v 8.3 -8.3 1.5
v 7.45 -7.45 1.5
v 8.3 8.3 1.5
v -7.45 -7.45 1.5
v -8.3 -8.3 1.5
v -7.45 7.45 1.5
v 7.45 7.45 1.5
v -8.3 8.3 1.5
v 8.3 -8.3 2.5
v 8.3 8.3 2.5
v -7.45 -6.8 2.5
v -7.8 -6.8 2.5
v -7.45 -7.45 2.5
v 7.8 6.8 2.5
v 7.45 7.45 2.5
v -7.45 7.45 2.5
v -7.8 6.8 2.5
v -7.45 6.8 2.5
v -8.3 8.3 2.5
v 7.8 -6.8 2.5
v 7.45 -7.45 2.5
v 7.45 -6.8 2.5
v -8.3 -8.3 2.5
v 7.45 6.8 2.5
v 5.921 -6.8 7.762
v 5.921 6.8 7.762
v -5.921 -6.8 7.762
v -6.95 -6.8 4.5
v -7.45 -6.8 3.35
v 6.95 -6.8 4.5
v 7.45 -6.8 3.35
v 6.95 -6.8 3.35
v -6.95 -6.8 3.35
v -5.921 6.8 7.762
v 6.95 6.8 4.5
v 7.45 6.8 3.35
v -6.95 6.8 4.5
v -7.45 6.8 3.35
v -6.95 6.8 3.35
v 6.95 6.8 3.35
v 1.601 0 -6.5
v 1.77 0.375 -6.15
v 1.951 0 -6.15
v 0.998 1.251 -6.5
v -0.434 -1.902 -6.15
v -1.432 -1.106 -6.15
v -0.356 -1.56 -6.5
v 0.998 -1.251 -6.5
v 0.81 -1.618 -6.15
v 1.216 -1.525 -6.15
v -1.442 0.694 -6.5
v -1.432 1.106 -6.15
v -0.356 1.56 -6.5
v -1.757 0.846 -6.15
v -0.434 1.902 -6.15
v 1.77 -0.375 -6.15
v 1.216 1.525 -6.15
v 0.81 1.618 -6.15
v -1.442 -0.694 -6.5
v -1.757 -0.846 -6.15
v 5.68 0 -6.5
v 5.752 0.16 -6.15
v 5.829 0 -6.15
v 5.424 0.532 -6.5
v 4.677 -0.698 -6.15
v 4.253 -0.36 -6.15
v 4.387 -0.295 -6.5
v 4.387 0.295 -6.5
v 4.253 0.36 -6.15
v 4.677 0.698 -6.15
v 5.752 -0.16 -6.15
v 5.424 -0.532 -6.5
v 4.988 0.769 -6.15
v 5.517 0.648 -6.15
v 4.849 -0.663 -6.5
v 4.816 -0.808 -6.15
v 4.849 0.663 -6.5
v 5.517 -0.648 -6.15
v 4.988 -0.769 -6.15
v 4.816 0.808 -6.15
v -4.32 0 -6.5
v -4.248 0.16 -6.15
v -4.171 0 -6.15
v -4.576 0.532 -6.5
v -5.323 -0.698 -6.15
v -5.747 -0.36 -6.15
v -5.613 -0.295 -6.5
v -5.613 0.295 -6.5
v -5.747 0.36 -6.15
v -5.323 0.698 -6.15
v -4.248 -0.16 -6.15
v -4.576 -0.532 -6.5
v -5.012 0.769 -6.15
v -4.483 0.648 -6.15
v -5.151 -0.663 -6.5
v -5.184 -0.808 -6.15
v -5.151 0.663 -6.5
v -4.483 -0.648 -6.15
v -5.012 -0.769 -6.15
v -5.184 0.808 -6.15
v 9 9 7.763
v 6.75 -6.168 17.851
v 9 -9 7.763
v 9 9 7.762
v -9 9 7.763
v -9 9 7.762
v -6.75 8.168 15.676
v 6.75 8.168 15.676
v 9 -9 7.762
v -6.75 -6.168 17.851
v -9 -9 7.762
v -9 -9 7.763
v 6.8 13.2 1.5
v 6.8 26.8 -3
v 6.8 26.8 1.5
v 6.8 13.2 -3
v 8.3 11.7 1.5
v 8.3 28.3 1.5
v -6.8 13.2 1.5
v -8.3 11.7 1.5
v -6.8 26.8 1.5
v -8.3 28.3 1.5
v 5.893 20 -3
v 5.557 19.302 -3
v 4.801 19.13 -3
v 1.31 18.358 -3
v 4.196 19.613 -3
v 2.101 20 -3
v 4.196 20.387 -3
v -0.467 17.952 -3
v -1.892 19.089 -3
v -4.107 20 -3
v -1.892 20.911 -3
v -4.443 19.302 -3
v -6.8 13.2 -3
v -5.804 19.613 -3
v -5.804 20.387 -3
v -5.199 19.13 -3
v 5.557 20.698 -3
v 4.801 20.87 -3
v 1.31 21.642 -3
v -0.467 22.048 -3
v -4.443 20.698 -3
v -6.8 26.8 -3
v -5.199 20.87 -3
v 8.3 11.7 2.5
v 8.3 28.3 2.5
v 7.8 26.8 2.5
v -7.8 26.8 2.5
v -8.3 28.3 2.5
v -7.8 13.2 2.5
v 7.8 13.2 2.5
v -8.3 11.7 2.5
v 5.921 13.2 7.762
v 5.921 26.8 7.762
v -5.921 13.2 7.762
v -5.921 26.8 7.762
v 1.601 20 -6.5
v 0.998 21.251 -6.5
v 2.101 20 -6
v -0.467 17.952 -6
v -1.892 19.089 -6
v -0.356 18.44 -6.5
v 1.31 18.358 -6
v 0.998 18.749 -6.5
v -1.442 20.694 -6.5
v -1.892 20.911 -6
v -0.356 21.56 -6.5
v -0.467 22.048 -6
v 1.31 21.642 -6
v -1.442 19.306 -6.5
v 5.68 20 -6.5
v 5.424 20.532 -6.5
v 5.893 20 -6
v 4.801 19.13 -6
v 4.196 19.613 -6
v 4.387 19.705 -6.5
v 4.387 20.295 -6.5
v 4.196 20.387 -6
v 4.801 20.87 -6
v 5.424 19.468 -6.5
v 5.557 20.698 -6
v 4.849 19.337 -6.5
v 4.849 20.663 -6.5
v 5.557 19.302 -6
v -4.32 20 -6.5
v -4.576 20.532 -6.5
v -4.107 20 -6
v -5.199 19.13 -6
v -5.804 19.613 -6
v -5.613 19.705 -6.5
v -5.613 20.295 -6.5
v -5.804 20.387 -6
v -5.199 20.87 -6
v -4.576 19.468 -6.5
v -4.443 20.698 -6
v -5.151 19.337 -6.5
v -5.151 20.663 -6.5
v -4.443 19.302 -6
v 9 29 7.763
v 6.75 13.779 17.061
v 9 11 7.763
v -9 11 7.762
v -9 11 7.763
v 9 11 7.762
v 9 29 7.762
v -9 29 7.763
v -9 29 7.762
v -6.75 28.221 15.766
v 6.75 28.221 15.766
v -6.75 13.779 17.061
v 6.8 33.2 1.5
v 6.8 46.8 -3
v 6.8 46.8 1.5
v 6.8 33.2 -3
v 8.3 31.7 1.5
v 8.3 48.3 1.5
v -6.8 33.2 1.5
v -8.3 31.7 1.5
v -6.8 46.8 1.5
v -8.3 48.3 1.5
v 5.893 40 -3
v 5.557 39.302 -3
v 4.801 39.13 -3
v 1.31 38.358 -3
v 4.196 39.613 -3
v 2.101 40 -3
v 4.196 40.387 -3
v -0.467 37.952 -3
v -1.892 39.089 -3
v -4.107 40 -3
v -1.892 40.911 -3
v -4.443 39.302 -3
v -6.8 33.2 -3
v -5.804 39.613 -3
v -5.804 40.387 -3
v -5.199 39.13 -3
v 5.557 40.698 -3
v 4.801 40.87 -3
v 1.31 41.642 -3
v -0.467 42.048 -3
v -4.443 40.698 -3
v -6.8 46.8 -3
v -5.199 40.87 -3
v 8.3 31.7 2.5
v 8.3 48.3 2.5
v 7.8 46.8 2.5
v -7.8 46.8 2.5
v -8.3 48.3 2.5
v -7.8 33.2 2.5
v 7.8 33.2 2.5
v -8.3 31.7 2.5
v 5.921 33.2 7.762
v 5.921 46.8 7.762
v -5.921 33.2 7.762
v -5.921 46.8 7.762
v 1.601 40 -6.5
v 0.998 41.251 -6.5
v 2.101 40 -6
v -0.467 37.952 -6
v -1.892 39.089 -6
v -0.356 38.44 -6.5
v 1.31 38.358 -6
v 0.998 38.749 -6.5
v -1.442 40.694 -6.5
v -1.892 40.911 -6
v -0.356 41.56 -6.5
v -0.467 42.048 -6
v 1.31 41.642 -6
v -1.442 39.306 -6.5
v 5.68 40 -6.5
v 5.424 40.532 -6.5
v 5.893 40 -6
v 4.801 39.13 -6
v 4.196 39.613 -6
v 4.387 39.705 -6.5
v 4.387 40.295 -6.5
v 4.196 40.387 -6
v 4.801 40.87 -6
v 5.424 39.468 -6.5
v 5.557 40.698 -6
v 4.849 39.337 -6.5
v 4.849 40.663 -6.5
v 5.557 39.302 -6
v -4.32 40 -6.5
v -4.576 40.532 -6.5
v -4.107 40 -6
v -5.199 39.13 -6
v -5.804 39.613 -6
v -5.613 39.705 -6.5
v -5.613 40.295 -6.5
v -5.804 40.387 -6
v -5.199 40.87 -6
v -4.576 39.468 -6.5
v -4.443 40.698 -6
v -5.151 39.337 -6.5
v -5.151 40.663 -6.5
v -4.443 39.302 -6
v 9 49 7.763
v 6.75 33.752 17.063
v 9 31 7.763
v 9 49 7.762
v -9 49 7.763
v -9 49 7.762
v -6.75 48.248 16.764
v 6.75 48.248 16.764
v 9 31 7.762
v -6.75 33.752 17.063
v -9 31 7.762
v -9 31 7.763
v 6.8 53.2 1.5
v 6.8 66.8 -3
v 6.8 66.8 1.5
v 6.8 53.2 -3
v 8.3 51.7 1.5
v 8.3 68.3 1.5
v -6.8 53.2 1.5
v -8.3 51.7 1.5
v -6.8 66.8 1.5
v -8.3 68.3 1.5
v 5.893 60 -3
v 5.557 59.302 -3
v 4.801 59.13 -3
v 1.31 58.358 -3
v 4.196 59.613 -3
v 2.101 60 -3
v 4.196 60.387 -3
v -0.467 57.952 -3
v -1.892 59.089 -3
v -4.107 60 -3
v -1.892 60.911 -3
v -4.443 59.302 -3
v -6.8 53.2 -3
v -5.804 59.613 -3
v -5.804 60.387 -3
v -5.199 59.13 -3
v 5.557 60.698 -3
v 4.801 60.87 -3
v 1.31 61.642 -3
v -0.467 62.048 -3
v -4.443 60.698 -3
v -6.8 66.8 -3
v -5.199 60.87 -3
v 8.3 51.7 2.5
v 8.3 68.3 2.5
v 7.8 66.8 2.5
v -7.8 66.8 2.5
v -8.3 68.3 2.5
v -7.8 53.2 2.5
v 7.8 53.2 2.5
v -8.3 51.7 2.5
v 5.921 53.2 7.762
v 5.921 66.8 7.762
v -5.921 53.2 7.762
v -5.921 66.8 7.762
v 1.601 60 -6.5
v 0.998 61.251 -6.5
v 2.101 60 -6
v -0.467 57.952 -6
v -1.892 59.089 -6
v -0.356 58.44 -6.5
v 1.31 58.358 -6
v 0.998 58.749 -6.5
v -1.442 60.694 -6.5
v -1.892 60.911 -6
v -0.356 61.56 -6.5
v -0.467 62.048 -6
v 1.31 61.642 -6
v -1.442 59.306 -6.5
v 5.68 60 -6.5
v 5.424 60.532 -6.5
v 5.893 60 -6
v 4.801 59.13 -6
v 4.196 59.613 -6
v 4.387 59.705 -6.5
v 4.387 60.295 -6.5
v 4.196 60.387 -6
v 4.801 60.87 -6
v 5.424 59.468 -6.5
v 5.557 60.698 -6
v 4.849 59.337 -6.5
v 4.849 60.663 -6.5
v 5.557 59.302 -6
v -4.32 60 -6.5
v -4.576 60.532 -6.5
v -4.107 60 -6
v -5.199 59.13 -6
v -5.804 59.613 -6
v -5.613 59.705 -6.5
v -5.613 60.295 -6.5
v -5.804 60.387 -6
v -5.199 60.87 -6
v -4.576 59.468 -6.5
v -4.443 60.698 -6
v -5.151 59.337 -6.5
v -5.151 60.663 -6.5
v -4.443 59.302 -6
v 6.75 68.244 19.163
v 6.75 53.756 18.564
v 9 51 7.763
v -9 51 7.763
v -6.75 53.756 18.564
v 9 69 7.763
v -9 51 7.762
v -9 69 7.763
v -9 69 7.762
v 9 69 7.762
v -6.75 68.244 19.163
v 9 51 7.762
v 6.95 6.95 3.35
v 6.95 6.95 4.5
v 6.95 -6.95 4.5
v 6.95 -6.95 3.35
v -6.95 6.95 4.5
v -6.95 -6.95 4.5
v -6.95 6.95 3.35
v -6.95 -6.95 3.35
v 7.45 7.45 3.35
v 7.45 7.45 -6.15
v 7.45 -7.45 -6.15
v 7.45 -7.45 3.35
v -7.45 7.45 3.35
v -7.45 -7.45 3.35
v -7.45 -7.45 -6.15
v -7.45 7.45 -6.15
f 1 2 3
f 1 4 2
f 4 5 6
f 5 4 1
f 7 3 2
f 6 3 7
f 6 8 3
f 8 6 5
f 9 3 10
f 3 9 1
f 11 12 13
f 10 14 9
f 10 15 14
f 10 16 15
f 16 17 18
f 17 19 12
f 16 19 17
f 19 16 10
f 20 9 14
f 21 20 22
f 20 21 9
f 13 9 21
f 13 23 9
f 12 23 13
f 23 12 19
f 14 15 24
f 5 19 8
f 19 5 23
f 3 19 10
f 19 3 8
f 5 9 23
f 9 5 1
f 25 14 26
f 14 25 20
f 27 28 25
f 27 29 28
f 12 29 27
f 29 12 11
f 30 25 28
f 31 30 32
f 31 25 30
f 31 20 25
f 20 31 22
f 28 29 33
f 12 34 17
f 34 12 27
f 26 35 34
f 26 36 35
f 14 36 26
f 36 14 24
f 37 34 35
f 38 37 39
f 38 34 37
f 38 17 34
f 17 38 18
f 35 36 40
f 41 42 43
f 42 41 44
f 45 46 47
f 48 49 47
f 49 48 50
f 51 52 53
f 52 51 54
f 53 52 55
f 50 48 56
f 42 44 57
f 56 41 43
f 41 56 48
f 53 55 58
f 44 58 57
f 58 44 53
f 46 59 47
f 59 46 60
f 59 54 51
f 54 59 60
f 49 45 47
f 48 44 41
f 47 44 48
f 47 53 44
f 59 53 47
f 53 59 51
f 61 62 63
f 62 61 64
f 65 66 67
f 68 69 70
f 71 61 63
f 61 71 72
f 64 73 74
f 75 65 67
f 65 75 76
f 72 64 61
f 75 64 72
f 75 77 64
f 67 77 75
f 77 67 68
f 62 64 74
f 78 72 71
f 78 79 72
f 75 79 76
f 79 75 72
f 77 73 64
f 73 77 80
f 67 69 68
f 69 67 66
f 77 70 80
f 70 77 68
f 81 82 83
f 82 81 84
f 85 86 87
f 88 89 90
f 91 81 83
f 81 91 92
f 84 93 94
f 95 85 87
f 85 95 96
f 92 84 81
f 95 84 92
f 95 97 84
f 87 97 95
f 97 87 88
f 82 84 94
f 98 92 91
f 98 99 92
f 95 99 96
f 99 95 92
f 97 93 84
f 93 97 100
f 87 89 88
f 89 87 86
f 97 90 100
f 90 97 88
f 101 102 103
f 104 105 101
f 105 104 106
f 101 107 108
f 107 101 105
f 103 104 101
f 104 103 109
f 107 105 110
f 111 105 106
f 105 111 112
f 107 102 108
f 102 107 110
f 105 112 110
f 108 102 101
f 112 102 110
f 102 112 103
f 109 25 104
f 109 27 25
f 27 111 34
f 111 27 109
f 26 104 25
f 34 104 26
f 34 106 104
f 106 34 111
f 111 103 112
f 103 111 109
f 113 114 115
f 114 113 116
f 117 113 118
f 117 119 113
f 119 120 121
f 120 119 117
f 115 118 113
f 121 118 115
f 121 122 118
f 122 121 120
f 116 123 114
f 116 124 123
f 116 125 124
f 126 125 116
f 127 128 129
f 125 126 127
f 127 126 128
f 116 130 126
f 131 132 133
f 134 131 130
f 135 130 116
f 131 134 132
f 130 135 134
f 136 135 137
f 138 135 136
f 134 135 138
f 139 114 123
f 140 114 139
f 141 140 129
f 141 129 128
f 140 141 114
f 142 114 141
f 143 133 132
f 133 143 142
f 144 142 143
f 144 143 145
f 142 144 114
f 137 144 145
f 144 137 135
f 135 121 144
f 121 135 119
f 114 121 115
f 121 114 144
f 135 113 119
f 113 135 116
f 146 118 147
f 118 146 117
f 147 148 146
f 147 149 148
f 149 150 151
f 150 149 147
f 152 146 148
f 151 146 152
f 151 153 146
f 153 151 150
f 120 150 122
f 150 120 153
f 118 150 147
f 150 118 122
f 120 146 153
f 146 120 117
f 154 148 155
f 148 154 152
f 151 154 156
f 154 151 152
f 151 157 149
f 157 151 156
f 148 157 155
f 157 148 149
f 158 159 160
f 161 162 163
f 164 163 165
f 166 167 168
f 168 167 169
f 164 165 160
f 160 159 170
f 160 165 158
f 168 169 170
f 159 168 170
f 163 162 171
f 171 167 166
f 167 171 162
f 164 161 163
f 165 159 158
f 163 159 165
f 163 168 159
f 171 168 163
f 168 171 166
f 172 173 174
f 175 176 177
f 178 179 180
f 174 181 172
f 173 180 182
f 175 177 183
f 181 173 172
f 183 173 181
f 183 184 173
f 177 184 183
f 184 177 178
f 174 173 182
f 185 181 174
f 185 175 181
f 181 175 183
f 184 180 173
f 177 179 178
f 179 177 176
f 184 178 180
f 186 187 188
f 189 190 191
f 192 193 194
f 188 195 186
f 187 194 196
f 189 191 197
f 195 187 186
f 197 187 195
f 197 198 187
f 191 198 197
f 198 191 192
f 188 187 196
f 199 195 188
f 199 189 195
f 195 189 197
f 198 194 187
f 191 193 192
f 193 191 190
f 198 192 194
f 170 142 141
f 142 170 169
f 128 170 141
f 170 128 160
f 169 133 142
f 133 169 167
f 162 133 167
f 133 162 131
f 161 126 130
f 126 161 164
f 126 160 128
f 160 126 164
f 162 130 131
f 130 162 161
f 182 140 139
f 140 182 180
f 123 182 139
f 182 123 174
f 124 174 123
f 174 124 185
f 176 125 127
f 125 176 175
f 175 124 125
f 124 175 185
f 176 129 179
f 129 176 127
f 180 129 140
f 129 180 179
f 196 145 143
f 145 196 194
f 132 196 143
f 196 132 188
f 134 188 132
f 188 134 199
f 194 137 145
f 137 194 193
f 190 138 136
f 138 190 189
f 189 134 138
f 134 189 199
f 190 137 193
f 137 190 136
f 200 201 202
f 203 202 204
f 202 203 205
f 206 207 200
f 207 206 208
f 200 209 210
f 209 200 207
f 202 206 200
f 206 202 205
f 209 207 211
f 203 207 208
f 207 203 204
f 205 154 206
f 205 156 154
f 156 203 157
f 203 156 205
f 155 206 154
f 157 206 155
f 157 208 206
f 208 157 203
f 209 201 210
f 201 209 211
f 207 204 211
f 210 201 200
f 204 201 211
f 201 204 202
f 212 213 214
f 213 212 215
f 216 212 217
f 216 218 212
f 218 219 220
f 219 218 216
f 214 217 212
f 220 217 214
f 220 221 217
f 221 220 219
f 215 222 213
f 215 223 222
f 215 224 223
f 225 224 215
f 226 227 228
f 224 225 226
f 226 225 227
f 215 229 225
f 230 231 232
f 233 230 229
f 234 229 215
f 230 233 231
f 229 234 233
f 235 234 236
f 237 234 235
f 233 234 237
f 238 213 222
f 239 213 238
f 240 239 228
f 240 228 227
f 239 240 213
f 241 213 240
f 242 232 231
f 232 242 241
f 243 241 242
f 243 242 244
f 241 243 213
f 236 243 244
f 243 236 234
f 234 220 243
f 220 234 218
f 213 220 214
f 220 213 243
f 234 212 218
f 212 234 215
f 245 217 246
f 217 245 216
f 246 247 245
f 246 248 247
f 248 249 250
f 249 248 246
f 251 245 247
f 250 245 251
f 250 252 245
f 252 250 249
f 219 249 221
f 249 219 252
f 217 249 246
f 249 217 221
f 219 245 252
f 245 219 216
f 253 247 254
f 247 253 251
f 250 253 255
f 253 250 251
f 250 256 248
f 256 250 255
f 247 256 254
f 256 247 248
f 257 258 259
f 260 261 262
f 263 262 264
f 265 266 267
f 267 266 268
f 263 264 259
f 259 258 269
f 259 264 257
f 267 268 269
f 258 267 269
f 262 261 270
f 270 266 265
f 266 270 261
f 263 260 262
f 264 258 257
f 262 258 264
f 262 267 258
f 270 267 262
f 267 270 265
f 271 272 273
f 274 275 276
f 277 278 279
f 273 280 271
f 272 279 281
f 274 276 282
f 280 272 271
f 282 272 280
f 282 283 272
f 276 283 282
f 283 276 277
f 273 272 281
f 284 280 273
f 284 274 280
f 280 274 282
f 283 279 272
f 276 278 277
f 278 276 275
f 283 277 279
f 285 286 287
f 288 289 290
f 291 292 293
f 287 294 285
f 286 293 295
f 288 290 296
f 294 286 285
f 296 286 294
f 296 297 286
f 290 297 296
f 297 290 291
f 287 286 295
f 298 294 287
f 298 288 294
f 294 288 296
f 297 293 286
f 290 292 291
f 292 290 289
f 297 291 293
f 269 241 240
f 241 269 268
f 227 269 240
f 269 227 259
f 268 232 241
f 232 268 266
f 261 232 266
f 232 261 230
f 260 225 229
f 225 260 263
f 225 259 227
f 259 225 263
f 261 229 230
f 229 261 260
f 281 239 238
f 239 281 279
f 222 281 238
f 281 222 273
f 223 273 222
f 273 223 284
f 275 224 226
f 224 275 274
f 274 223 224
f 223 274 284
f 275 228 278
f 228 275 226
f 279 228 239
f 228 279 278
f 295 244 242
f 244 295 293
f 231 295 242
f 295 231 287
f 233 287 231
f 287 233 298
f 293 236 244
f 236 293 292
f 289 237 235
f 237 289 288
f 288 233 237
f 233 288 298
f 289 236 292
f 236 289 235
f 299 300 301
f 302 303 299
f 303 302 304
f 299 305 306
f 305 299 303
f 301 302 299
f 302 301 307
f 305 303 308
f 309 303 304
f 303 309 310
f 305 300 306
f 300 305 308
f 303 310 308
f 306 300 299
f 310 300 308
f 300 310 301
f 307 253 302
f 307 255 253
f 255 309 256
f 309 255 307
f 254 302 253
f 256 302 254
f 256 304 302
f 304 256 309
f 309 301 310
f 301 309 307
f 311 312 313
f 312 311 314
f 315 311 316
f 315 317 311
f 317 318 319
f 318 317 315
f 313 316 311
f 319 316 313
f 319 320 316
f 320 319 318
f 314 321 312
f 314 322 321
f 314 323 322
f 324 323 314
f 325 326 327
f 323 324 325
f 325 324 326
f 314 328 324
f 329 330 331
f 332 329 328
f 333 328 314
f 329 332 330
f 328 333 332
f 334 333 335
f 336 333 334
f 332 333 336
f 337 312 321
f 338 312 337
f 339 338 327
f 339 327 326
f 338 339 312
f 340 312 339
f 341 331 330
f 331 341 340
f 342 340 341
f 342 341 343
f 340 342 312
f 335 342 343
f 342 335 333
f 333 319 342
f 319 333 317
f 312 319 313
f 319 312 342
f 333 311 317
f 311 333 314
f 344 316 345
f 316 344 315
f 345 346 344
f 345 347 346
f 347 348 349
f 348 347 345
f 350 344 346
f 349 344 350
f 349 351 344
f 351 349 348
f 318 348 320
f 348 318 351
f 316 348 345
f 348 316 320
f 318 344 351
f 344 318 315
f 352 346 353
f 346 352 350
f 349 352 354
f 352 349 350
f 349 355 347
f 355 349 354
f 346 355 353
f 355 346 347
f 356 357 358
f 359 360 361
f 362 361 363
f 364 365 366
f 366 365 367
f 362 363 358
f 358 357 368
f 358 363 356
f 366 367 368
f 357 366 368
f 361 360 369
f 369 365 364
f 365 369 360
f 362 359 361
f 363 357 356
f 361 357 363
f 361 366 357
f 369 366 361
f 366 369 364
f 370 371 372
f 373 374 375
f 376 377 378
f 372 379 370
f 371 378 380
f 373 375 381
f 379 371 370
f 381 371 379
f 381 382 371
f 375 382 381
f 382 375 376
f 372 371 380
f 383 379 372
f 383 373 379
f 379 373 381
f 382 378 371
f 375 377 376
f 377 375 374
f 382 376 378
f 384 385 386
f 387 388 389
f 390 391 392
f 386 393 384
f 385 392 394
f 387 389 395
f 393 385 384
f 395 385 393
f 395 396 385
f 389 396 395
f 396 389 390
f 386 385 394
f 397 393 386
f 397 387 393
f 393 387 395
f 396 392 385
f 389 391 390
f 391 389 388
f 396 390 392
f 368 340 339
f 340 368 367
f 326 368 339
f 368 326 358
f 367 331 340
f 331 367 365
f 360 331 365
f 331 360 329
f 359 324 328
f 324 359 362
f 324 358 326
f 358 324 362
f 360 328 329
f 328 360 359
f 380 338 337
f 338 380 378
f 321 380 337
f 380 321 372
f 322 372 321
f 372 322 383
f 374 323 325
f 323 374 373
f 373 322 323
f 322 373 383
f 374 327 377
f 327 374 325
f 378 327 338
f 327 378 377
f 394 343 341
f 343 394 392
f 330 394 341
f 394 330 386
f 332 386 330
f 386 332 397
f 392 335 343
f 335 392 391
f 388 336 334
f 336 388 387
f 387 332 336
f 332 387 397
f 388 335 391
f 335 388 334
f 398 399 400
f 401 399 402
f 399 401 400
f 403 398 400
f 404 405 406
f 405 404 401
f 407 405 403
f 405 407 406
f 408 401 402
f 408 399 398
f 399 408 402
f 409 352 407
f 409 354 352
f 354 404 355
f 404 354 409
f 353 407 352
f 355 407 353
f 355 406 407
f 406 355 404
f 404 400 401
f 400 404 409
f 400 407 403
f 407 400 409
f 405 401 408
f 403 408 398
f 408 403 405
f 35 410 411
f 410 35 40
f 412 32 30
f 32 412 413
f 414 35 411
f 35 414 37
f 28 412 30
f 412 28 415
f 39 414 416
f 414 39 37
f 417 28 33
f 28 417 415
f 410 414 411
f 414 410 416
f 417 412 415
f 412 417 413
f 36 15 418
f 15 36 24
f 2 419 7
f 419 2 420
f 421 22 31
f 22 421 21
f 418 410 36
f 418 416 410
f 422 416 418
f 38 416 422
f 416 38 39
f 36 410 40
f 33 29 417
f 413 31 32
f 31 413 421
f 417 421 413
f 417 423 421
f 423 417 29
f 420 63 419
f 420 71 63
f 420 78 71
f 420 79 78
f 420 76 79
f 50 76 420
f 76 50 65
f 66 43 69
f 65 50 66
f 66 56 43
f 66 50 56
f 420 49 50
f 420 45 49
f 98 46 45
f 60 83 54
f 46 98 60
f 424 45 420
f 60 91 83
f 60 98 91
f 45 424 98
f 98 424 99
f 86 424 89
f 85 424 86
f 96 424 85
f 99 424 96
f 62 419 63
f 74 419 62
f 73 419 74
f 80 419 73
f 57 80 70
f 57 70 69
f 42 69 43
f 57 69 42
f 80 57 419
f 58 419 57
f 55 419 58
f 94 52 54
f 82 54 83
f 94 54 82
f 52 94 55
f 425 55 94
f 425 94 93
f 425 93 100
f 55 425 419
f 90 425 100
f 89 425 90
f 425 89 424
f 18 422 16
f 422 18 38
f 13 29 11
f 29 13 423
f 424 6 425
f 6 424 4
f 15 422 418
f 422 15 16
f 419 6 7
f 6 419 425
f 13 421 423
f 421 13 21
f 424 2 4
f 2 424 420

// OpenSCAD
//Enum Switch Type
MX   = 0;  // Generic MX
Choc = 1;  // Low profile 
Alps = 2;  // For Your Superiority Complex's Needs

//Switch cutawy Type
Cherry = 2; // for indent clip key cuts

//Cap type applys to MX only?
//Cherry = 0;
DSA = 1;
OEM = 2;
SA  = 4;
MT3 = 3;

//parameters
plate_thickness = 1;
plate_size = 15.6;
edge_offset = 1;
bottom_size = plate_size - 2;

top_height = 11.6;

switch_height = 3.0;
switch_thick = 1;
switch_width = 5;
switch_length = 3;

cap_height = .38*25.4;
cap_heightShift = 0.69*25.4;
cap_width = 18.3;

bottom_height = 4.5;
bottom_chamfer_width = 3.05;
bottom_chamfer_height =  1;
bottom_chamfer_thickness = .6;

bottom_peg_diameter = 4.075/.97;
bottom_peg_height =  3.5;
bottom_peg_chamfer = .5;
bottom_peg_side_scale = 1.7/4;

//dummy key switch with caps to check position
module Switch(switchScale= [1,1,1], CapColor = "ivory", StemColor = "black", clipLength = 0, type = Choc, Caps = DSA, Row = 0)
{
  if (type == MX){
    difference(){
      union(){
        translate([0,0,-switch_height])
        {
          color("grey"){
            translate([-bottom_size/2, -bottom_size/2 ,0])cube([bottom_size,bottom_size,bottom_height]);
            translate([-plate_size/2-edge_offset /2, -plate_size/2-edge_offset/2, bottom_height])cube([15.6+edge_offset ,15.6+edge_offset ,1]);

            translate([-plate_size/2, -plate_size/2, bottom_height])cube([15.6,15.6,1]);
            translate([-plate_size/2, -plate_size/2, bottom_height])cube([15.6,15.6,1]);

            translate([0,0, bottom_height+plate_thickness])translate([-15.6/2,13.6/2,0])rotate([90,0,0])linear_extrude(13.6)polygon(points = [[0,0], [15.6, 0], [13.6, 5.6], [2,5.6]]);
          }

          color(StemColor){
            translate([-switch_width/2, -switch_thick/2, top_height-1])cube([switch_width, switch_thick, switch_height]);
            translate([-switch_thick/2, -switch_length/2, top_height-1])cube([switch_thick, switch_length, switch_height]);
            translate([-plate_size/4, -plate_size/6, top_height-.5])cube([plate_size/2, plate_size/3, 0.25]);
          }
          if (Caps ==DSA){
            scale(switchScale)color(CapColor){
              translate([0,0,cap_heightShift-2])rotate([0,0,45])cylinder(d1 = cap_width*sqrt(2),d2 = (plate_size -4)*sqrt(2), 7.5, $fn=4, center = true);
            }
          } else if (Caps == OEM){
              if( Row == 0) {
                scale(switchScale)color(CapColor){
                  translate([0,0,cap_heightShift/2+2])
                    hull(){
                      cube([18,18,.001], center = true);
                      translate([0,1,(10.1+7.9)/2])rotate([atan((7.9-10.1)/14.5),0,0])cube([13.5,14.5,.001], center = true);
                  }
                }
              } else if( Row == 1) {
                scale(switchScale)color(CapColor){
                  translate([0,0,cap_heightShift/2+2])
                    hull(){
                      cube([18,18,.001], center = true);
                      translate([0,1,(8+9.3)/2])rotate([atan((8-9.3)/14.5),0,0])cube([13.5,14.5,.001], center = true);
                  }
                }
              } else if( Row == 2) {
              scale(switchScale)color(CapColor){
                  translate([0,0,cap_heightShift/2+2])
                    hull(){
                      cube([18,18,.001], center = true);
                      translate([0,1,(9+9.3)/2])rotate([atan((9-9.3)/14.5),0,0])cube([13.5,14.5,.001], center = true);
                  }
                }
              } else if( Row == 3) {
                scale(switchScale)color(CapColor){
                  translate([0,0,cap_heightShift/2+2])
                    hull(){
                      cube([18,18,.001], center = true);
                      translate([0,1,(11.4+10.8)/2])rotate([atan((11.4-10.8)/14.5),0,0])cube([13.5,14.5,.001], center = true);
                  }
                }
              }
          }
          else if (Caps == SA){
            scale(switchScale)color(CapColor){
              translate([0,0,cap_heightShift])rotate([0,0,45])cylinder(d1 = cap_width*sqrt(2),d2 = (plate_size -4)*sqrt(2), 11.73, $fn=4, center = true);
            }
          }
          color("grey"){
            translate([0,0, -(bottom_peg_height -bottom_peg_chamfer)]){
              cylinder(d=bottom_peg_diameter, h= bottom_peg_height -bottom_peg_chamfer);
              translate([5,0,0])scale(v=[bottom_peg_side_scale,bottom_peg_side_scale,1])cylinder(d=bottom_peg_diameter, h= bottom_peg_height -bottom_peg_chamfer);
              translate([-5,0,0])scale(v=[bottom_peg_side_scale,bottom_peg_side_scale,1])cylinder(d=bottom_peg_diameter, h= bottom_peg_height -bottom_peg_chamfer);

              translate([0,0, -bottom_peg_chamfer]){
                cylinder(d2=bottom_peg_diameter , d1 = bottom_peg_diameter -2*bottom_peg_chamfer, h= bottom_peg_chamfer);
                translate([5,0,0])scale(v=[bottom_peg_side_scale,bottom_peg_side_scale,1])cylinder(d2=bottom_peg_diameter , d1 = bottom_peg_diameter -2*bottom_peg_chamfer, h= bottom_peg_chamfer);
                translate([-5,0,0])scale(v=[bottom_peg_side_scale,bottom_peg_side_scale,1])cylinder(d2=bottom_peg_diameter , d1 = bottom_peg_diameter -2*bottom_peg_chamfer, h= bottom_peg_chamfer);
              }
            }
          }
        }
      }
      if (clipLength != 0){ // commiting unholy act in name of ergonomics
        translate([0, -sign(clipLength)*7.8-clipLength,  0])scale(switchScale)cube([20, 15.6, 50], center = true);
      }
    }
  } else if (type == Choc){
    difference(){
      union(){
        translate([0,0,1.75]){
          difference(){
            translate([0,0,0.5])cube([15,15,1], center = true);
            //cuts
        //    translate([15/2-1/2,0,.5])cube([1,10.5,2], center = true);
        //    translate([-15/2+1/2,0,.5])cube([1,10.5,2], center = true);
          }

          translate([0,0,1.5])cube([13,13,2], center = true);
          color(StemColor)translate([0,0,4])cube([11.4,4,3], center = true);
          color(StemColor)translate([0,1,4])cube([3,5,3], center = true);
          color("DarkSlateGray")translate([0,0,-1])cube([13,14,2,],center = true);
          color("DarkSlateGray")translate([0,0,-2-2.5])cylinder(d=3.3, 2.5);
          color("DarkSlateGray")translate([5,0,-2-2.5])cylinder(d=1.6, 2.5); 
          color("DarkSlateGray")translate([-5,0,-2-2.5])cylinder(d=1.6, 2.5); 

          //cap
          scale(switchScale)color(CapColor)hull(){
            translate([0,0,4.5+1])cube([17.5,16.8,2],center = true);
            translate([0,1.25,4.5+1+1.5])cube([14.5,12.5,1.5],center = true);
          }
        }
      }
      if (clipLength != 0){ // commiting unholy act in name of ergonomics
        translate([0, -sign(clipLength)*7.8-clipLength,  0])scale(switchScale)cube([20, 15.6, 40], center = true);
      }
    }
  }
  else if (type == Alps){
    //TODO build Alps MockUp
  }
}

module Cutter()
{
  bottom_height = 4.5;
  bottom_chamfer_width = 3;
  bottom_chamfer_height =  1;
  bottom_chamfer_thickness = .6;

  bottom_peg_diameter = 4;
  bottom_peg_height =  3;
  bottom_peg_chamfer = 1;
  bottom_peg_side_scale = 1.7/4;

  translate([-bottom_size/2, -bottom_size/2 ,0])cube([bottom_size,bottom_size,bottom_height]);

  translate([0,0, -(bottom_peg_height -bottom_peg_chamfer)]){
    cylinder(d=bottom_peg_diameter, h= bottom_peg_height -bottom_peg_chamfer);
    translate([5,0,0])scale(v=[bottom_peg_side_scale,bottom_peg_side_scale,1])cylinder(d=bottom_peg_diameter, h= bottom_peg_height -bottom_peg_chamfer);
    translate([-5,0,0])scale(v=[bottom_peg_side_scale,bottom_peg_side_scale,1])cylinder(d=bottom_peg_diameter, h= bottom_peg_height -bottom_peg_chamfer);

    translate([0,0, -bottom_peg_chamfer]){
      cylinder(d2=bottom_peg_diameter , d1 = bottom_peg_diameter -2*bottom_peg_chamfer, h= bottom_peg_chamfer);
      translate([5,0,0])scale(v=[bottom_peg_side_scale,bottom_peg_side_scale,1])cylinder(d2=bottom_peg_diameter , d1 = bottom_peg_diameter -2*bottom_peg_chamfer, h= bottom_peg_chamfer);
      translate([-5,0,0])scale(v=[bottom_peg_side_scale,bottom_peg_side_scale,1])cylinder(d2=bottom_peg_diameter , d1 = bottom_peg_diameter -2*bottom_peg_chamfer, h= bottom_peg_chamfer);
    }
  }
}

module Keyhole(tol = .1, cutThickness = .5, clipLength = 0, type = MX, boffsets = 1)
{
  $fn = 10;
  bottom_length = 13.9; //should be 14 for mx
  //plate_thickness = 20;
  plate_thickness=(type != MX ) ? 3.51 :9;
  holeLength = bottom_length+tol*2;
  holeLenghtChoc = 13.8+tol*2;
  //latch nibs
  nib_radius= 1;
  nib_length = 3;
  if(type == MX){
    translate([0,0,-1.25])difference(){
      union(){
        translate([0,0,1.25])cube([holeLength, holeLength, plate_thickness+tol], center =true);
        translate([0,0,.1-cutThickness/2])cube([holeLength+boffsets, holeLength+boffsets, plate_thickness+cutThickness], center =true);  
      }
      
      union(){
        if (clipLength != 0){
          translate([0, -sign(clipLength)*7.8-clipLength, 0])cube([20, 15.6, 40], center = true);
        }
      }
    }
   } else if(type == Choc){
    translate([0,0,-1.25])difference(){
      union(){
        translate([0,0,1.25])cube([holeLenghtChoc, holeLenghtChoc, plate_thickness+tol], center =true);
        translate([0,0,.1-cutThickness/2])cube([holeLength+boffsets, holeLength+boffsets, plate_thickness+cutThickness], center =true);  
      }
      
      union(){
        if (clipLength != 0){
          translate([0, -sign(clipLength)*7.8-clipLength, 0])cube([20, 15.6, 40], center = true);
        }
      }
  }
  } else if (type == Cherry){
    difference(){
      translate([0,0,-cutThickness/2])cube( [holeLength, holeLength, plate_thickness+cutThickness], center =true);

      union(){
        hull(){
          translate([(holeLength)/2, ,0,-plate_thickness/2+nib_radius])rotate([90,0,0])cylinder(r =nib_radius , nib_length,center = true);
          translate([(holeLength)/2, ,-nib_length/2,-plate_thickness/2])cube([nib_radius*2, nib_length, plate_thickness]);
        }
        mirror([1,0,0])hull(){
          translate([(holeLength)/2, ,0,-plate_thickness/2+nib_radius])rotate([90,0,0])cylinder(r =nib_radius , nib_length,center = true);
          translate([(holeLength)/2, ,-nib_length/2,-plate_thickness/2])cube([nib_radius*2, nib_length, plate_thickness]);
        }
        if (clipLength != 0){
          translate([0, -sign(clipLength)*7.8-clipLength, 0])cube([20, 15.6, 40], center = true);
        }
      }    
    }
  }
}

module Stabilizer(offsets = 23.8/2)
{
  plate_thickness = 3.6; //mm
  stabilizer_width = 5;
  stabilizer_length = 12.2;
  translate([offsets,0,0])cube([stabilizer_width,stabilizer_length,plate_thickness], center = true);
  translate([-offsets,0,0])cube([stabilizer_width,stabilizer_length,plate_thickness], center = true);
}

module TrackPoint(nibLength = 20)
{
  color("red")translate([0,0,-.5])cube([4.5,4.5,5], center= true); //nib
  color("gold")cylinder(d = 2, nibLength); //nib
  color("gold")translate([0,0,nibLength])sphere(2); //nib
  translate([0,30.3/2-8,-3/2])cube([26.46, 30.3, 3], center = true);
}

module RotaryEncoder(stemLength = 13, Wheel = 0)
{
 color("grey")translate([0,0, -6.1/2])cube([11.5, 13.5, 6.1], center = true);
 cylinder(d = 7, 7.8);

 translate([0,0,7.8])difference(){
   cylinder(d = 5.8, stemLength);
   translate([-5.8/2,5.8/2-1.5,3])cube([11.5, 13.5, stemLength]);
 }
 color("grey")translate([0,0,7.8])cylinder(d = Wheel, stemLength);
}
module HotSwap(thickness = 3){
 translate([0,-5.9,-1.8]){
   cube([5,5,thickness], center = true);
   translate([5,5.9-3.8,0])cube([5,5,thickness],center = true);
   hull(){
      translate([4.5/2-.25,-1,0,])cube([1,2,thickness], center = true);
      translate([-(-5/2-.5),6.9-3.8,0])cube([1,2,thickness],center = true);
   }
   translate([-3.5,0,0])cube([2,2,thickness],center = true);
   translate([8.5,5.9-3.8,0])cube([2,2,thickness],center = true);
 }
}
//################ Test Calls ###################
Switch(switchScale= [1,1,1],clipLength = -0, type = MX, Caps = OEM, StemColor = "purple", Row = 0);
translate([0,20,0])Switch(switchScale= [1,1,1],clipLength = -0, type = MX, Caps = OEM, StemColor = "purple", Row = 1);
translate([0,40,0])Switch(switchScale= [1,1,1],clipLength = -0, type = MX, Caps = OEM, StemColor = "purple", Row = 2);
translate([0,60,0])Switch(switchScale= [1,1,1],clipLength = -0, type = MX, Caps = OEM, StemColor = "purple", Row = 3);
//#HotSwap();
Keyhole(tol = -0, clipLength = -0, type = MX);
//Stabilizer(20);
// RotaryEncoder(Wheel = 0);
//Switch([1,1.5,1]);
//TrackPoint();
